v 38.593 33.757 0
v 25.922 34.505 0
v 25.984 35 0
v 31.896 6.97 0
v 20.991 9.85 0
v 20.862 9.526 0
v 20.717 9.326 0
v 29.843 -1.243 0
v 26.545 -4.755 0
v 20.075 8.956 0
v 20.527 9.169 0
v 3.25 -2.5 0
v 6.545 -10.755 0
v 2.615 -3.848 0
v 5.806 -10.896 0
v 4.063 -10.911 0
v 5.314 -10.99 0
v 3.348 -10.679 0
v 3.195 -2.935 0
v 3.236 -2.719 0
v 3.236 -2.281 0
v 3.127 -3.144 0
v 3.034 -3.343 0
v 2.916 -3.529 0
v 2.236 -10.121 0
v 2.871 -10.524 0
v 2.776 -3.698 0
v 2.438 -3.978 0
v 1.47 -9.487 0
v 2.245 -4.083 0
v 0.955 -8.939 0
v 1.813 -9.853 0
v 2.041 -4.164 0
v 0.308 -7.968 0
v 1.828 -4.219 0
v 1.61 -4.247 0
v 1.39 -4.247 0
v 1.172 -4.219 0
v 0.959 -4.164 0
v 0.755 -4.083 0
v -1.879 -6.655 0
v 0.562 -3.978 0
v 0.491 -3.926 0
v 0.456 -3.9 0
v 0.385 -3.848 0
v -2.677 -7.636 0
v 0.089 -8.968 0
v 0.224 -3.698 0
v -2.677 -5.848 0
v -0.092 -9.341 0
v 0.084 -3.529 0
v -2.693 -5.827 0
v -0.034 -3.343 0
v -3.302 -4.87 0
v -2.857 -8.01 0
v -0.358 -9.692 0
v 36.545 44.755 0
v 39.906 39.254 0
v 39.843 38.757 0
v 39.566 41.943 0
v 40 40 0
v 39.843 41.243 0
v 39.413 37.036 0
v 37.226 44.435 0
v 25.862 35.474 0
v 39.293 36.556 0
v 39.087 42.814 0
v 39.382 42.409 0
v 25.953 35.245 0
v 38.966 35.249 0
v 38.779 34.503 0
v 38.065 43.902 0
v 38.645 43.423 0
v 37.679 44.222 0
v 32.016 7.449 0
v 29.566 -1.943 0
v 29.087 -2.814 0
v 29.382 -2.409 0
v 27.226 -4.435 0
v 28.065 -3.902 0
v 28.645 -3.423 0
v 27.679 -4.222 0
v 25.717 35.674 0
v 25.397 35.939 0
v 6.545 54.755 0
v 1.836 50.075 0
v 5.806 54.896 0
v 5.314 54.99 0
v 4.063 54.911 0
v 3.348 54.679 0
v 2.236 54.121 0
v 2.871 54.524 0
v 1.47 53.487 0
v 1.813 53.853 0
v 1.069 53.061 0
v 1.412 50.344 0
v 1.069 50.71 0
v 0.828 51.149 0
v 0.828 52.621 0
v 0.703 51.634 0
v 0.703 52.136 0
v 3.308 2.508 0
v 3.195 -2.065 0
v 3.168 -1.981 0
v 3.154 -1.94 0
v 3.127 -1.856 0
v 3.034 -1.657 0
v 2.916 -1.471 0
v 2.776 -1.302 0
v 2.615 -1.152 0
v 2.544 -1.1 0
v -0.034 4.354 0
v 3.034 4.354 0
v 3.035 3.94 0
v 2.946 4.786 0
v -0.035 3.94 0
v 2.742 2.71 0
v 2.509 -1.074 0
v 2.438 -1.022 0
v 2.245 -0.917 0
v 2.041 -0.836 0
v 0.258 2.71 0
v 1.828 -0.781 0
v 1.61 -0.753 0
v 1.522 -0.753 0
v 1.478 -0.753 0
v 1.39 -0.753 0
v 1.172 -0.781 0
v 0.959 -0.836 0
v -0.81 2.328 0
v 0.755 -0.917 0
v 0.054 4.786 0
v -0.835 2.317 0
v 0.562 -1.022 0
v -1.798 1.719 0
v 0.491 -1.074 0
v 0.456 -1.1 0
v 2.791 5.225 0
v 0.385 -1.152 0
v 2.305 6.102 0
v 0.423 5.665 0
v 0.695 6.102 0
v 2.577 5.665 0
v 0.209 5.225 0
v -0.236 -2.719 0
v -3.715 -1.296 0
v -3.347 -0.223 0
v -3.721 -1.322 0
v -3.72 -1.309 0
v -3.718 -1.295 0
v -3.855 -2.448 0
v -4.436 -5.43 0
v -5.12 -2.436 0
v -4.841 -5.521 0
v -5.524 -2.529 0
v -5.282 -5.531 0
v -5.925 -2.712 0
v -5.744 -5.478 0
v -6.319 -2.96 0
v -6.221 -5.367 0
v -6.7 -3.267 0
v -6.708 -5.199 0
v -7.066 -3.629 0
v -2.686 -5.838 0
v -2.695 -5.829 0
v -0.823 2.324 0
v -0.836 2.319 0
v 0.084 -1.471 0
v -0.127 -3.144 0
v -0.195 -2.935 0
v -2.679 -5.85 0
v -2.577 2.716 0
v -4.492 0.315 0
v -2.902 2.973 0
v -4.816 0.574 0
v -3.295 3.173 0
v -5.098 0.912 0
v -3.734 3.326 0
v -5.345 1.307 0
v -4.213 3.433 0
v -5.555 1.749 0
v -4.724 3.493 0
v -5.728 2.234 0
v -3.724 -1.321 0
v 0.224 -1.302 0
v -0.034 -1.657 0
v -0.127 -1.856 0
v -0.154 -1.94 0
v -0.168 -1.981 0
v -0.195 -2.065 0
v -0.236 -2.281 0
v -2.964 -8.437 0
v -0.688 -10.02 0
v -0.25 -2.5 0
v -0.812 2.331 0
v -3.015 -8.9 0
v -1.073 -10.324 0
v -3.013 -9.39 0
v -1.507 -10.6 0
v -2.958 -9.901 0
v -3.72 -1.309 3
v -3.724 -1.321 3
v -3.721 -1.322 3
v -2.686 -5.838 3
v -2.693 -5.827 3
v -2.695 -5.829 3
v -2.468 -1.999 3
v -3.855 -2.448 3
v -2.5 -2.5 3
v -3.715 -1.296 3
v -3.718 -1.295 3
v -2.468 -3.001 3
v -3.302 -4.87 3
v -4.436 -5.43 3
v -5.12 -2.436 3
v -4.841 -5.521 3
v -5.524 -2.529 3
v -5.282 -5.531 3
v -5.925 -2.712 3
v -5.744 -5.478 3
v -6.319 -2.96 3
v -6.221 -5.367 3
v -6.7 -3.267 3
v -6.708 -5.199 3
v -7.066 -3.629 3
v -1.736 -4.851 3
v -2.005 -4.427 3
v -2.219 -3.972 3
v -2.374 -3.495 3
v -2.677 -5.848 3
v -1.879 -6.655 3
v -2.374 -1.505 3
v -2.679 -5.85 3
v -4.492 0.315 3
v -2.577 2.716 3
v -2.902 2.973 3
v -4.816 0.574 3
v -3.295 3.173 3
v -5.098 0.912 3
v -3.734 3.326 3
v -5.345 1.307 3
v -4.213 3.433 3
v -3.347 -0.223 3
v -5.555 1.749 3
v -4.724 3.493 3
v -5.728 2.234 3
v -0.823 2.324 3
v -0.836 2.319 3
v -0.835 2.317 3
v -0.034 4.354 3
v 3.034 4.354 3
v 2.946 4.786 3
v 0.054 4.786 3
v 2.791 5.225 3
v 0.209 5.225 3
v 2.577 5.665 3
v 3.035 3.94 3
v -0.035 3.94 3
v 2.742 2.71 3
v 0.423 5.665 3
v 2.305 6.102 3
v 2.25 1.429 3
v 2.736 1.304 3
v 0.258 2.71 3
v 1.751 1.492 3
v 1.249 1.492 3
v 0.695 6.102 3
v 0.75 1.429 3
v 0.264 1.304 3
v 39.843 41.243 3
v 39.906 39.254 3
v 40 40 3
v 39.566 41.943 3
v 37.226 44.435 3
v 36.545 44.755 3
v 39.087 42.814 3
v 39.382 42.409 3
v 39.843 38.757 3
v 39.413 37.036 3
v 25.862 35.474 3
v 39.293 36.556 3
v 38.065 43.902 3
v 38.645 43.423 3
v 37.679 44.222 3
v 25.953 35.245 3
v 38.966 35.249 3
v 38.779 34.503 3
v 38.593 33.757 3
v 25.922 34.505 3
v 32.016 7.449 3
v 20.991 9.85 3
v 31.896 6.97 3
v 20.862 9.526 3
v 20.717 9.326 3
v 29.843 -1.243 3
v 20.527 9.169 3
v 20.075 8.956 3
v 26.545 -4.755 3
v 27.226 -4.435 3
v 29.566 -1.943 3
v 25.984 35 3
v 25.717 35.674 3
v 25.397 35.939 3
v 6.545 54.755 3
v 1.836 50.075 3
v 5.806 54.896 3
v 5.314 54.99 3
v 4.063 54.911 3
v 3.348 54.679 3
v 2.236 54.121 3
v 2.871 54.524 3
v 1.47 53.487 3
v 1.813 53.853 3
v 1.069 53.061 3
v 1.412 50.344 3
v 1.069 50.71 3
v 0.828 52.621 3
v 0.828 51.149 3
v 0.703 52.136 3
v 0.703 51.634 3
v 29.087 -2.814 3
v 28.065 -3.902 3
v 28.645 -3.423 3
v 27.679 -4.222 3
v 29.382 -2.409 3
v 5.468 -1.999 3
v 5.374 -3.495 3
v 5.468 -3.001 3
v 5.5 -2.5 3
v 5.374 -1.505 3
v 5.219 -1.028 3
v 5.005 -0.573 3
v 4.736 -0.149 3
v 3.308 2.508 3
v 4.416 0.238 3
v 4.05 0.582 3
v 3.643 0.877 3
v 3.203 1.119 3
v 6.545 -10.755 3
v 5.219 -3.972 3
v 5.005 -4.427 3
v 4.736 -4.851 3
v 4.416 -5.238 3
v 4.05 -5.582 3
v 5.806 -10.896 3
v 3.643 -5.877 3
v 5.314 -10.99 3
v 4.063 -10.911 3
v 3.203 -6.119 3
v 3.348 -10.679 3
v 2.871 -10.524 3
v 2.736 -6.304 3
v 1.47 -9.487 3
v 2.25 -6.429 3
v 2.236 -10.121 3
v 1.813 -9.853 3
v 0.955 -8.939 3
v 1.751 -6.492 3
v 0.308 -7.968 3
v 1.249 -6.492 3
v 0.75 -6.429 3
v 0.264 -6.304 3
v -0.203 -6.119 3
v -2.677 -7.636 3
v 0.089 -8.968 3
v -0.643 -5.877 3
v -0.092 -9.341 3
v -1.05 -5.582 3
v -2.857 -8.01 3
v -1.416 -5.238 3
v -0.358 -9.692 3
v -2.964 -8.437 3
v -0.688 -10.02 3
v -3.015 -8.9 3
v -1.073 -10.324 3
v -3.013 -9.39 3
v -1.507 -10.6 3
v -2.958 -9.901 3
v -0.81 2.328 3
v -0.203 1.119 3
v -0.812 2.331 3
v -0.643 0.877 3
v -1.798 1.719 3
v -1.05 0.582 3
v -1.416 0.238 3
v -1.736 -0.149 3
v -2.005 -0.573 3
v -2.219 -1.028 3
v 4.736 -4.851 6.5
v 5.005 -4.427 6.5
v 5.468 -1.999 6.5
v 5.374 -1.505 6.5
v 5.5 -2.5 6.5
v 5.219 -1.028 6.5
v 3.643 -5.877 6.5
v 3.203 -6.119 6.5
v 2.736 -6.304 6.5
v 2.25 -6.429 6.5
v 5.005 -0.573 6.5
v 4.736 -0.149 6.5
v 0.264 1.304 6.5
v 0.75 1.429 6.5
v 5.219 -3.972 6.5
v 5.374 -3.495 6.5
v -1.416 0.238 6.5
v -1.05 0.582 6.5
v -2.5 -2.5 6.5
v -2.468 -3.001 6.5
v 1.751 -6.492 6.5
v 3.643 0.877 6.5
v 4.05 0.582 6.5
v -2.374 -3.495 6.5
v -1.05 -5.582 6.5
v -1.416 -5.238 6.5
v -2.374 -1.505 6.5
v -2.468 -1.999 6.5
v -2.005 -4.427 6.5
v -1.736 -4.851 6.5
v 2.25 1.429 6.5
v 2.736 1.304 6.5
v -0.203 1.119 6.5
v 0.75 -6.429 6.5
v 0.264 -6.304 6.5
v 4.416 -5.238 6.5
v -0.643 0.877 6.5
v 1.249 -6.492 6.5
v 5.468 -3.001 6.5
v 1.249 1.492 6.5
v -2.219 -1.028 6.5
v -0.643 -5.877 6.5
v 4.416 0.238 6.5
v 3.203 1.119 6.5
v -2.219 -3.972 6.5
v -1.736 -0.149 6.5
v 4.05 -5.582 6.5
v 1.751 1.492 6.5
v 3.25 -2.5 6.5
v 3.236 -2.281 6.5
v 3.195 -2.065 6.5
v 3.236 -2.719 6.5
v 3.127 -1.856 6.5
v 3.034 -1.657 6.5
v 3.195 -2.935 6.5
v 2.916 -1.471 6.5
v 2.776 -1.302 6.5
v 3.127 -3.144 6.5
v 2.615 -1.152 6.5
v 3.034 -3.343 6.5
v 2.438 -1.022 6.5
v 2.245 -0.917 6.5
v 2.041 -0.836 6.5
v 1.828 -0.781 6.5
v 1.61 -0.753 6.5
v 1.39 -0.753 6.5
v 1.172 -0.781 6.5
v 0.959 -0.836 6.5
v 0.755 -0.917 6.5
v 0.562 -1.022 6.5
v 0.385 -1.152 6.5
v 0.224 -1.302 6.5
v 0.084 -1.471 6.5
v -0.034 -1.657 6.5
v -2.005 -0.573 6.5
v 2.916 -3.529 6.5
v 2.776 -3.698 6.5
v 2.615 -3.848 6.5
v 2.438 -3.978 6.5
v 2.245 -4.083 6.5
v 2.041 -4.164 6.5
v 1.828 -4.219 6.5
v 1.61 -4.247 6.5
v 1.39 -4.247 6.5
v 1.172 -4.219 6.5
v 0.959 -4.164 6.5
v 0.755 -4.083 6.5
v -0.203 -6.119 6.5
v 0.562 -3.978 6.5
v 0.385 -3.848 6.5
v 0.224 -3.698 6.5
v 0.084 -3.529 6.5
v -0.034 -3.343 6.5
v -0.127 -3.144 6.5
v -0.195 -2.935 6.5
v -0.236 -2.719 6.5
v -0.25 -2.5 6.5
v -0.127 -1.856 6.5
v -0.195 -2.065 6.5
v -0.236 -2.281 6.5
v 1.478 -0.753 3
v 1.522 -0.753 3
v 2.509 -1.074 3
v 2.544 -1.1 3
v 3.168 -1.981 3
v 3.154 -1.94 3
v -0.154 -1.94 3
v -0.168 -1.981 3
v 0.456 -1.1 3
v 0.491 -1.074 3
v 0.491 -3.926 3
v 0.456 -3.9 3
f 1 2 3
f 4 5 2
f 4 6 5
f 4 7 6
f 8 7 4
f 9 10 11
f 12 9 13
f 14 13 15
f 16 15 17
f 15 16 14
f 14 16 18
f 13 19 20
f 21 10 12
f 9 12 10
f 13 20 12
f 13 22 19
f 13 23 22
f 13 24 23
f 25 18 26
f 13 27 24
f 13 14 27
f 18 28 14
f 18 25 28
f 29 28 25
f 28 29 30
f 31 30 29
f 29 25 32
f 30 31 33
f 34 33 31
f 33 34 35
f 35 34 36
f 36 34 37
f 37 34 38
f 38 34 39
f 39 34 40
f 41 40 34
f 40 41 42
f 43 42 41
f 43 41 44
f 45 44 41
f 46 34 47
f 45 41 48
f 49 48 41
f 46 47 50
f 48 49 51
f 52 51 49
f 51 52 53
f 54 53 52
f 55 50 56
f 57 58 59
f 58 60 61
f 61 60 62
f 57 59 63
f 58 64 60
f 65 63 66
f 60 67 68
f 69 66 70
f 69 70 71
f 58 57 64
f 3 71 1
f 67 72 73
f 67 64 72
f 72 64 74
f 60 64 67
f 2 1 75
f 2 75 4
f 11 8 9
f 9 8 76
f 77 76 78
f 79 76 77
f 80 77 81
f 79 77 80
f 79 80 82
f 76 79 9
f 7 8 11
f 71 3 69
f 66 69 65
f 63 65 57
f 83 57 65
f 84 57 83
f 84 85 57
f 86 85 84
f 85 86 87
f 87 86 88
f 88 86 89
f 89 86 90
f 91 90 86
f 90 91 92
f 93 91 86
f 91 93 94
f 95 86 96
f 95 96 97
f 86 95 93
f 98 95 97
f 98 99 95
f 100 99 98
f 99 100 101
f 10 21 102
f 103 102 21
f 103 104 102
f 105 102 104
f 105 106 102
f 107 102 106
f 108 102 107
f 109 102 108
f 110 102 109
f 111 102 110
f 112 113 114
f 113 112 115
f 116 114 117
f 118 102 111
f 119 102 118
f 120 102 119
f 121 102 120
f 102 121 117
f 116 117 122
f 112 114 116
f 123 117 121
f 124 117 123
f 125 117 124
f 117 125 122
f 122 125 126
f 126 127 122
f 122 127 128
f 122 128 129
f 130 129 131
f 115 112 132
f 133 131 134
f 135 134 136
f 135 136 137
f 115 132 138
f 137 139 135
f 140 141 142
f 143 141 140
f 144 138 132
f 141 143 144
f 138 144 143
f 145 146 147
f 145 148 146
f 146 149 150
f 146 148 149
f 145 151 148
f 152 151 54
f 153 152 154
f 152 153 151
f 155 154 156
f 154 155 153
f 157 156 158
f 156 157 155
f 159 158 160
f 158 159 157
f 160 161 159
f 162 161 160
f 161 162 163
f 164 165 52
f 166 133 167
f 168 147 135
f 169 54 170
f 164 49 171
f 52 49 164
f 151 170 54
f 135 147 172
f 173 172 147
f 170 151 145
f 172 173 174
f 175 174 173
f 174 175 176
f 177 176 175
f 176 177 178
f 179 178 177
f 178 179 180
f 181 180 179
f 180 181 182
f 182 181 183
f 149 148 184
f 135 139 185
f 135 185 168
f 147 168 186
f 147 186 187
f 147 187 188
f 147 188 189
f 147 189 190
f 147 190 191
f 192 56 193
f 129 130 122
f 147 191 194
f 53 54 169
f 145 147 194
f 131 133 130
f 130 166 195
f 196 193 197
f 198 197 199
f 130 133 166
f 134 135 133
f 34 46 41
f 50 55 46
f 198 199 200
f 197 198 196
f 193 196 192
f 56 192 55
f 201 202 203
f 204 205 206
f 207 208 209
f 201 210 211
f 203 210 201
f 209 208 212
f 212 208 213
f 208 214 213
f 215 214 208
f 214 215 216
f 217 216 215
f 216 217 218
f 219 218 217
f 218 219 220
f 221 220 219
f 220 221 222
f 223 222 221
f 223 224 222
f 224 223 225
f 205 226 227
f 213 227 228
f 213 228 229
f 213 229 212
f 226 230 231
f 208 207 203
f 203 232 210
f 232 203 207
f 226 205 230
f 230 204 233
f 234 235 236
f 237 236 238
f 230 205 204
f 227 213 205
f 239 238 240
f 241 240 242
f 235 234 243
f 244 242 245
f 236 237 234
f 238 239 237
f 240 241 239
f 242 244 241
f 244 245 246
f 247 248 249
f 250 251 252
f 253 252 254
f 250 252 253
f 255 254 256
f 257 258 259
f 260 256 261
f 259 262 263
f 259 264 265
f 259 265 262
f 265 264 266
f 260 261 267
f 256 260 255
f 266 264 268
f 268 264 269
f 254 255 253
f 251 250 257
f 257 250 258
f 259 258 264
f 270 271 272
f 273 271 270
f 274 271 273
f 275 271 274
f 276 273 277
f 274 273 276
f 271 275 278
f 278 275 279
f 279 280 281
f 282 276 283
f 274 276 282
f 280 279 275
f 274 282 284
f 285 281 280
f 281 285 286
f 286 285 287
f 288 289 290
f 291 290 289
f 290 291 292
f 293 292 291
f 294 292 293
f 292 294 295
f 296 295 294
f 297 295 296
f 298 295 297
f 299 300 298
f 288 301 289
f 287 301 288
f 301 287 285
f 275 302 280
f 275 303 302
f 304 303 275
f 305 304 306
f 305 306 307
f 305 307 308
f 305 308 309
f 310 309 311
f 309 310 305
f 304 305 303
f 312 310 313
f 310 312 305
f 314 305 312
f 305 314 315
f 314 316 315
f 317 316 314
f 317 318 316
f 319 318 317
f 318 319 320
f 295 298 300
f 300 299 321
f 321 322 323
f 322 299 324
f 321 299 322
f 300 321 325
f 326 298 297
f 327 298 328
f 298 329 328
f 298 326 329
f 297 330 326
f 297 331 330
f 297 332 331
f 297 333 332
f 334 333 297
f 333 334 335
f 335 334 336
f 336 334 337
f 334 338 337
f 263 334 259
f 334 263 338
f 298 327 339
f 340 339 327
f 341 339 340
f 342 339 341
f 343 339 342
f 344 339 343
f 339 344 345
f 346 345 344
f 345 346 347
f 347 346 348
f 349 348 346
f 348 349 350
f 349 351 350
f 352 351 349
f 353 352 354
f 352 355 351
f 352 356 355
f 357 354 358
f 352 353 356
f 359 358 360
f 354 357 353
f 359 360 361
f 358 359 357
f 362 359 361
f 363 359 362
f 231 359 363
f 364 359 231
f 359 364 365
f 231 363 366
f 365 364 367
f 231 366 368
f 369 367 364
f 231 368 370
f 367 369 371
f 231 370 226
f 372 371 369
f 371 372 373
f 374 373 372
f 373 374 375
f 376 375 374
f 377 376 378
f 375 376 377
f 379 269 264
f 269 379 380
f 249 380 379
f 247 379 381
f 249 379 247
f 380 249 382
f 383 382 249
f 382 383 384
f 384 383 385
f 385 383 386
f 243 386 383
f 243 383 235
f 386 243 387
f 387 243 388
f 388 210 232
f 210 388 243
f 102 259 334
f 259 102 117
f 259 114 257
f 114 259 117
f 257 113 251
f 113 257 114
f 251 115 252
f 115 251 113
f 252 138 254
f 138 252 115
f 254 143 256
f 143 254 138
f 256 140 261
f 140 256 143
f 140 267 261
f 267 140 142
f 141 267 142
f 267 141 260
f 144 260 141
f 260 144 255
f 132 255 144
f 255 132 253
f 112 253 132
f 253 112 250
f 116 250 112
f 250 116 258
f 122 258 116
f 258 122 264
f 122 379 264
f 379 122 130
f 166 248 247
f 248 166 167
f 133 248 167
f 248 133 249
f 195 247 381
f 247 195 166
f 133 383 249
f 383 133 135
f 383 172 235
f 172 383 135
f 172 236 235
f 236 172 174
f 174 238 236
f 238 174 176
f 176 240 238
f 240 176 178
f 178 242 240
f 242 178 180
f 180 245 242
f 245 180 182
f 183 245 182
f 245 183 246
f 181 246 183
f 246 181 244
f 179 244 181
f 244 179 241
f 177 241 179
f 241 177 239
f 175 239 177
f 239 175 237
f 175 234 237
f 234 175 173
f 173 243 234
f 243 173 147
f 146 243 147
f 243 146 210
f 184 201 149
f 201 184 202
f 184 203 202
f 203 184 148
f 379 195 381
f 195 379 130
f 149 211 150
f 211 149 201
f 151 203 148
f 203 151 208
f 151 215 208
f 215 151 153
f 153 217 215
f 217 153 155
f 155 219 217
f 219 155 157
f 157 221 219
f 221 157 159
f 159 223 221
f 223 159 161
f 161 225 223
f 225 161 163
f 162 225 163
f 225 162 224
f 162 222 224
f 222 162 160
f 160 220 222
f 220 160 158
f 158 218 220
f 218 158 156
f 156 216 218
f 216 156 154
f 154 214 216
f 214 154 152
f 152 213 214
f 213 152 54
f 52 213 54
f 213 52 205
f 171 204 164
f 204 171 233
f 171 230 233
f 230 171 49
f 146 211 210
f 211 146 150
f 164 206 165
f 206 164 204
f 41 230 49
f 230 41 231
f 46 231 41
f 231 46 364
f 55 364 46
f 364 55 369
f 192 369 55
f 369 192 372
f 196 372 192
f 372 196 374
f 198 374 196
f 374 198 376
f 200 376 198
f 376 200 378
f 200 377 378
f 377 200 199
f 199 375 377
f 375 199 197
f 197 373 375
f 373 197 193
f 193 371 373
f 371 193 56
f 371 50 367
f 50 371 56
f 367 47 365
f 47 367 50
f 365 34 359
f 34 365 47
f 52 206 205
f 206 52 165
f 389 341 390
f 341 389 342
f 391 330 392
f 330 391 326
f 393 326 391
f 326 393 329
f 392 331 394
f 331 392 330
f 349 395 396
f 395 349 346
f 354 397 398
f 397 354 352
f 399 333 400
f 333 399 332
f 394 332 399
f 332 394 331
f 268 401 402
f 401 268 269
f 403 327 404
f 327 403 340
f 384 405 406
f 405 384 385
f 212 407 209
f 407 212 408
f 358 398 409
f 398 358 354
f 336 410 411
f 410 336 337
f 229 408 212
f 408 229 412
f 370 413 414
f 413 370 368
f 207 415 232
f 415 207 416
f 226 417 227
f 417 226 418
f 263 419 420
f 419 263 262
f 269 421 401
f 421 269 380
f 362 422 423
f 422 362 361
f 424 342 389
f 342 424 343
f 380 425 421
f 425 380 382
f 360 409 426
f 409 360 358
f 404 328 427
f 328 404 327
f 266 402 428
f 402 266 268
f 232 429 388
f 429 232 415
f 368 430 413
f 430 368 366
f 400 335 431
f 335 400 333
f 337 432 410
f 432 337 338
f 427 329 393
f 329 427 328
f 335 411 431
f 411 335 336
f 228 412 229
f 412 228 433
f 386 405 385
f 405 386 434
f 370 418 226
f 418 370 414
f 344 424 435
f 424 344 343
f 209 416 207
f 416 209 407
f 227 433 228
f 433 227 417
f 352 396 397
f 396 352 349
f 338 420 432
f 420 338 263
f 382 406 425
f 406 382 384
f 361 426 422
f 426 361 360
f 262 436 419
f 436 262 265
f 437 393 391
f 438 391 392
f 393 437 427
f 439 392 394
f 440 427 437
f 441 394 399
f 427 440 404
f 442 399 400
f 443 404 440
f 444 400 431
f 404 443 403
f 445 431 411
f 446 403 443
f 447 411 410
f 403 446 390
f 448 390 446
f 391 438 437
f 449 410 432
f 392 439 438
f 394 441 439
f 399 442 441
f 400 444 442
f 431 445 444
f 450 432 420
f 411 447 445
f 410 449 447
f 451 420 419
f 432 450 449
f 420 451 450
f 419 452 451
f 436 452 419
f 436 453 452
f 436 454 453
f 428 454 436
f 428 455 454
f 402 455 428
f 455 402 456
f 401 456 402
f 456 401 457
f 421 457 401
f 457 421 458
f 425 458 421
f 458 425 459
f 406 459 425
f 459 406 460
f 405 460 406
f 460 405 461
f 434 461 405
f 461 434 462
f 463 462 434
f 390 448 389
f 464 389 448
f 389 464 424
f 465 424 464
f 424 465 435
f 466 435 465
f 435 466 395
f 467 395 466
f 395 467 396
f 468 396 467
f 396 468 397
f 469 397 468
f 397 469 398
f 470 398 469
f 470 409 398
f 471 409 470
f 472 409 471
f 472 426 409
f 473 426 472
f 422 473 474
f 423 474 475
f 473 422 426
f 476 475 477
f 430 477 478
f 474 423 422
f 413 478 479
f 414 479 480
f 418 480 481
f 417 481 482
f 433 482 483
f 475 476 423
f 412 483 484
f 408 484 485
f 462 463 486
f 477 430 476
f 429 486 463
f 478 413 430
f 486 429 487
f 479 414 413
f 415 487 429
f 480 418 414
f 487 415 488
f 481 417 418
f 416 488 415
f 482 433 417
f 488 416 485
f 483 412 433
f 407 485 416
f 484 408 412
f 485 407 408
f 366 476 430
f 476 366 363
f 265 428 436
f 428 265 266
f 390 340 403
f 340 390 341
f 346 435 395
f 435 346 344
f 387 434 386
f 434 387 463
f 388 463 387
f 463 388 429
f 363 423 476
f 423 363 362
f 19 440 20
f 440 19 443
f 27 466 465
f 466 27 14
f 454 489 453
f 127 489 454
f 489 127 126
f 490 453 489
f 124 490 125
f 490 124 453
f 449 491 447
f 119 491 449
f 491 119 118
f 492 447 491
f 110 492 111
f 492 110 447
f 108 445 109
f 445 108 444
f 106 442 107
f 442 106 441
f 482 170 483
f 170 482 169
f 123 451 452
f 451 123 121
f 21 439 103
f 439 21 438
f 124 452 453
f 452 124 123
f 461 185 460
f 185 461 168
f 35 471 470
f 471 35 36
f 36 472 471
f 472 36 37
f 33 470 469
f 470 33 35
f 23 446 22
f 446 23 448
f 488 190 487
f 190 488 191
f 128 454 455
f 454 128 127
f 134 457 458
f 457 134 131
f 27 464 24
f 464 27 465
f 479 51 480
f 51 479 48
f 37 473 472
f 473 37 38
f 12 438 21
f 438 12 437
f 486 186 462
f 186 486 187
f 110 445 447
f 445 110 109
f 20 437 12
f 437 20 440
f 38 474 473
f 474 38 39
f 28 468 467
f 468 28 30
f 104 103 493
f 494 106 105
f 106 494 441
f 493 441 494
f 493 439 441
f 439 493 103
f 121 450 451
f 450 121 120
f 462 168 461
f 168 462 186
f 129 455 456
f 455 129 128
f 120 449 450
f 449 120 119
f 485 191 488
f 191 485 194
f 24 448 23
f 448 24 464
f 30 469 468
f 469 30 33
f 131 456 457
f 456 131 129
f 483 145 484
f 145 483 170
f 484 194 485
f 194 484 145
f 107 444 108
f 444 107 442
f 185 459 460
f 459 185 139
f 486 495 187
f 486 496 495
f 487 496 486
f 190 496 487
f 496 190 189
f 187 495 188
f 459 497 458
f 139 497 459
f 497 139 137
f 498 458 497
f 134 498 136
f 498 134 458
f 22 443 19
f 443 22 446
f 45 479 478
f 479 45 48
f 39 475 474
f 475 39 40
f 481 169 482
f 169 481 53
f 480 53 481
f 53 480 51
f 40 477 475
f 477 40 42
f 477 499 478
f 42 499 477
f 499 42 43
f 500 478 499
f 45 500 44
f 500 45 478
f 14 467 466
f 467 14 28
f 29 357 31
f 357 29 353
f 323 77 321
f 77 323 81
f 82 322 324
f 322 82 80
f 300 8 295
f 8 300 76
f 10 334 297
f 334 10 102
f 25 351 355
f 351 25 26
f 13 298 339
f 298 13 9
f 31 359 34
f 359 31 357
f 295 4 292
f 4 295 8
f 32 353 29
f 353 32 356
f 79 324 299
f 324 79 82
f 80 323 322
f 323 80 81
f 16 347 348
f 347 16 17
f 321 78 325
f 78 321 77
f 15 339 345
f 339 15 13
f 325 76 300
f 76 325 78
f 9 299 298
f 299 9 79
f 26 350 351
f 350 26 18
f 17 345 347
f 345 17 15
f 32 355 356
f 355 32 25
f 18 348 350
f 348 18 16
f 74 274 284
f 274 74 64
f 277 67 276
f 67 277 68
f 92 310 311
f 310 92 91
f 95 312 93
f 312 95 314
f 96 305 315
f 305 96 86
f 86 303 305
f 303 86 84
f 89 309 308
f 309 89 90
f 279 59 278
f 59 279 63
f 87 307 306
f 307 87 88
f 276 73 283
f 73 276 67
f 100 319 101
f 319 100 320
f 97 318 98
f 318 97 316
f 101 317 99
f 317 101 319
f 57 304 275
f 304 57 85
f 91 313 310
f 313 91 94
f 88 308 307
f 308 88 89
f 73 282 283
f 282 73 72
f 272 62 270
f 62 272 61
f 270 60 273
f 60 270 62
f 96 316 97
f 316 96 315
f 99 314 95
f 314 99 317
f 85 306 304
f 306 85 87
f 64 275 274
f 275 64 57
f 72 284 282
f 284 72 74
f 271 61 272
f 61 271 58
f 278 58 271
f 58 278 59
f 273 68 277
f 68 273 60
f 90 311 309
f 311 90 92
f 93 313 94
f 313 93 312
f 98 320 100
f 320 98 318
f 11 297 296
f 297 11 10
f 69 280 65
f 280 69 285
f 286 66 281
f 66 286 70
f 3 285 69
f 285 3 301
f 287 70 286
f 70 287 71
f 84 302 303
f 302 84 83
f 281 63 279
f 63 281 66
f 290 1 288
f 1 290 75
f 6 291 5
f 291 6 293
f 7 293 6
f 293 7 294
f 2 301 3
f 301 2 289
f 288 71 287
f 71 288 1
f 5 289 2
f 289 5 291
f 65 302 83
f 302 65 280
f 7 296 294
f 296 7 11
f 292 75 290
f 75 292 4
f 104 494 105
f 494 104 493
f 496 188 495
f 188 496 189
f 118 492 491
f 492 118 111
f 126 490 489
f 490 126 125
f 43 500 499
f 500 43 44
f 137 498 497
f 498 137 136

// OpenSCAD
//ROBOTIC CLAW
//pincer attached to servo
//JGH 17/12/2013

$fn=25;
height=1.5;

translate([0,0,3])	//Orient for printing
rotate([0,180,0])

//GEAR

translate([-1.5,-2.5,3])
rotate ([0,180,0])
include <claw_gear_free.scad>;



translate([0,0,0])	//Orient for printing
//rotate([0,180,0])
		
//PINCER
difference(){
		
		minkowski(){		//everything inside the Minkoski is double the height (I have no idea why)
							//to fix this I set the variable height=1.5 (it should be 3)
			difference(){
				color([0,0,1])
				hull(){
					translate([1, 0, 0])
					cylinder(r=3, h=height);
		
					translate([5, -6, 0])
					cylinder(r=3, h=height);
					
					translate([25, 0, 0])
					cylinder(r=3, h=height);
					
					translate([35, 40, 0])
					cylinder(r=3, h=height);
					
					translate([5, 50, 0])
					cylinder(r=3, h=height);
				}
				
				hull(){
					translate([-6, 0, 0])
					cylinder(r=3, h=height);
					
					translate([20, 10, 0])
					cylinder(r=3, h=height);
					
					translate([25, 35, 0])
					cylinder(r=3, h=height);
					
					translate([0, 50, 0])
					cylinder(r=3, h=height);
				}
			
			}
		
			cylinder(r=2, h=height);
		
		}

	//SAME HOLES AS IN GEAR
	translate([1.5,-2.5,0]){
	color([0,0,1])
	cylinder(r=3.5/2, h=20, $fn=50, center=true);
	
	}
}
